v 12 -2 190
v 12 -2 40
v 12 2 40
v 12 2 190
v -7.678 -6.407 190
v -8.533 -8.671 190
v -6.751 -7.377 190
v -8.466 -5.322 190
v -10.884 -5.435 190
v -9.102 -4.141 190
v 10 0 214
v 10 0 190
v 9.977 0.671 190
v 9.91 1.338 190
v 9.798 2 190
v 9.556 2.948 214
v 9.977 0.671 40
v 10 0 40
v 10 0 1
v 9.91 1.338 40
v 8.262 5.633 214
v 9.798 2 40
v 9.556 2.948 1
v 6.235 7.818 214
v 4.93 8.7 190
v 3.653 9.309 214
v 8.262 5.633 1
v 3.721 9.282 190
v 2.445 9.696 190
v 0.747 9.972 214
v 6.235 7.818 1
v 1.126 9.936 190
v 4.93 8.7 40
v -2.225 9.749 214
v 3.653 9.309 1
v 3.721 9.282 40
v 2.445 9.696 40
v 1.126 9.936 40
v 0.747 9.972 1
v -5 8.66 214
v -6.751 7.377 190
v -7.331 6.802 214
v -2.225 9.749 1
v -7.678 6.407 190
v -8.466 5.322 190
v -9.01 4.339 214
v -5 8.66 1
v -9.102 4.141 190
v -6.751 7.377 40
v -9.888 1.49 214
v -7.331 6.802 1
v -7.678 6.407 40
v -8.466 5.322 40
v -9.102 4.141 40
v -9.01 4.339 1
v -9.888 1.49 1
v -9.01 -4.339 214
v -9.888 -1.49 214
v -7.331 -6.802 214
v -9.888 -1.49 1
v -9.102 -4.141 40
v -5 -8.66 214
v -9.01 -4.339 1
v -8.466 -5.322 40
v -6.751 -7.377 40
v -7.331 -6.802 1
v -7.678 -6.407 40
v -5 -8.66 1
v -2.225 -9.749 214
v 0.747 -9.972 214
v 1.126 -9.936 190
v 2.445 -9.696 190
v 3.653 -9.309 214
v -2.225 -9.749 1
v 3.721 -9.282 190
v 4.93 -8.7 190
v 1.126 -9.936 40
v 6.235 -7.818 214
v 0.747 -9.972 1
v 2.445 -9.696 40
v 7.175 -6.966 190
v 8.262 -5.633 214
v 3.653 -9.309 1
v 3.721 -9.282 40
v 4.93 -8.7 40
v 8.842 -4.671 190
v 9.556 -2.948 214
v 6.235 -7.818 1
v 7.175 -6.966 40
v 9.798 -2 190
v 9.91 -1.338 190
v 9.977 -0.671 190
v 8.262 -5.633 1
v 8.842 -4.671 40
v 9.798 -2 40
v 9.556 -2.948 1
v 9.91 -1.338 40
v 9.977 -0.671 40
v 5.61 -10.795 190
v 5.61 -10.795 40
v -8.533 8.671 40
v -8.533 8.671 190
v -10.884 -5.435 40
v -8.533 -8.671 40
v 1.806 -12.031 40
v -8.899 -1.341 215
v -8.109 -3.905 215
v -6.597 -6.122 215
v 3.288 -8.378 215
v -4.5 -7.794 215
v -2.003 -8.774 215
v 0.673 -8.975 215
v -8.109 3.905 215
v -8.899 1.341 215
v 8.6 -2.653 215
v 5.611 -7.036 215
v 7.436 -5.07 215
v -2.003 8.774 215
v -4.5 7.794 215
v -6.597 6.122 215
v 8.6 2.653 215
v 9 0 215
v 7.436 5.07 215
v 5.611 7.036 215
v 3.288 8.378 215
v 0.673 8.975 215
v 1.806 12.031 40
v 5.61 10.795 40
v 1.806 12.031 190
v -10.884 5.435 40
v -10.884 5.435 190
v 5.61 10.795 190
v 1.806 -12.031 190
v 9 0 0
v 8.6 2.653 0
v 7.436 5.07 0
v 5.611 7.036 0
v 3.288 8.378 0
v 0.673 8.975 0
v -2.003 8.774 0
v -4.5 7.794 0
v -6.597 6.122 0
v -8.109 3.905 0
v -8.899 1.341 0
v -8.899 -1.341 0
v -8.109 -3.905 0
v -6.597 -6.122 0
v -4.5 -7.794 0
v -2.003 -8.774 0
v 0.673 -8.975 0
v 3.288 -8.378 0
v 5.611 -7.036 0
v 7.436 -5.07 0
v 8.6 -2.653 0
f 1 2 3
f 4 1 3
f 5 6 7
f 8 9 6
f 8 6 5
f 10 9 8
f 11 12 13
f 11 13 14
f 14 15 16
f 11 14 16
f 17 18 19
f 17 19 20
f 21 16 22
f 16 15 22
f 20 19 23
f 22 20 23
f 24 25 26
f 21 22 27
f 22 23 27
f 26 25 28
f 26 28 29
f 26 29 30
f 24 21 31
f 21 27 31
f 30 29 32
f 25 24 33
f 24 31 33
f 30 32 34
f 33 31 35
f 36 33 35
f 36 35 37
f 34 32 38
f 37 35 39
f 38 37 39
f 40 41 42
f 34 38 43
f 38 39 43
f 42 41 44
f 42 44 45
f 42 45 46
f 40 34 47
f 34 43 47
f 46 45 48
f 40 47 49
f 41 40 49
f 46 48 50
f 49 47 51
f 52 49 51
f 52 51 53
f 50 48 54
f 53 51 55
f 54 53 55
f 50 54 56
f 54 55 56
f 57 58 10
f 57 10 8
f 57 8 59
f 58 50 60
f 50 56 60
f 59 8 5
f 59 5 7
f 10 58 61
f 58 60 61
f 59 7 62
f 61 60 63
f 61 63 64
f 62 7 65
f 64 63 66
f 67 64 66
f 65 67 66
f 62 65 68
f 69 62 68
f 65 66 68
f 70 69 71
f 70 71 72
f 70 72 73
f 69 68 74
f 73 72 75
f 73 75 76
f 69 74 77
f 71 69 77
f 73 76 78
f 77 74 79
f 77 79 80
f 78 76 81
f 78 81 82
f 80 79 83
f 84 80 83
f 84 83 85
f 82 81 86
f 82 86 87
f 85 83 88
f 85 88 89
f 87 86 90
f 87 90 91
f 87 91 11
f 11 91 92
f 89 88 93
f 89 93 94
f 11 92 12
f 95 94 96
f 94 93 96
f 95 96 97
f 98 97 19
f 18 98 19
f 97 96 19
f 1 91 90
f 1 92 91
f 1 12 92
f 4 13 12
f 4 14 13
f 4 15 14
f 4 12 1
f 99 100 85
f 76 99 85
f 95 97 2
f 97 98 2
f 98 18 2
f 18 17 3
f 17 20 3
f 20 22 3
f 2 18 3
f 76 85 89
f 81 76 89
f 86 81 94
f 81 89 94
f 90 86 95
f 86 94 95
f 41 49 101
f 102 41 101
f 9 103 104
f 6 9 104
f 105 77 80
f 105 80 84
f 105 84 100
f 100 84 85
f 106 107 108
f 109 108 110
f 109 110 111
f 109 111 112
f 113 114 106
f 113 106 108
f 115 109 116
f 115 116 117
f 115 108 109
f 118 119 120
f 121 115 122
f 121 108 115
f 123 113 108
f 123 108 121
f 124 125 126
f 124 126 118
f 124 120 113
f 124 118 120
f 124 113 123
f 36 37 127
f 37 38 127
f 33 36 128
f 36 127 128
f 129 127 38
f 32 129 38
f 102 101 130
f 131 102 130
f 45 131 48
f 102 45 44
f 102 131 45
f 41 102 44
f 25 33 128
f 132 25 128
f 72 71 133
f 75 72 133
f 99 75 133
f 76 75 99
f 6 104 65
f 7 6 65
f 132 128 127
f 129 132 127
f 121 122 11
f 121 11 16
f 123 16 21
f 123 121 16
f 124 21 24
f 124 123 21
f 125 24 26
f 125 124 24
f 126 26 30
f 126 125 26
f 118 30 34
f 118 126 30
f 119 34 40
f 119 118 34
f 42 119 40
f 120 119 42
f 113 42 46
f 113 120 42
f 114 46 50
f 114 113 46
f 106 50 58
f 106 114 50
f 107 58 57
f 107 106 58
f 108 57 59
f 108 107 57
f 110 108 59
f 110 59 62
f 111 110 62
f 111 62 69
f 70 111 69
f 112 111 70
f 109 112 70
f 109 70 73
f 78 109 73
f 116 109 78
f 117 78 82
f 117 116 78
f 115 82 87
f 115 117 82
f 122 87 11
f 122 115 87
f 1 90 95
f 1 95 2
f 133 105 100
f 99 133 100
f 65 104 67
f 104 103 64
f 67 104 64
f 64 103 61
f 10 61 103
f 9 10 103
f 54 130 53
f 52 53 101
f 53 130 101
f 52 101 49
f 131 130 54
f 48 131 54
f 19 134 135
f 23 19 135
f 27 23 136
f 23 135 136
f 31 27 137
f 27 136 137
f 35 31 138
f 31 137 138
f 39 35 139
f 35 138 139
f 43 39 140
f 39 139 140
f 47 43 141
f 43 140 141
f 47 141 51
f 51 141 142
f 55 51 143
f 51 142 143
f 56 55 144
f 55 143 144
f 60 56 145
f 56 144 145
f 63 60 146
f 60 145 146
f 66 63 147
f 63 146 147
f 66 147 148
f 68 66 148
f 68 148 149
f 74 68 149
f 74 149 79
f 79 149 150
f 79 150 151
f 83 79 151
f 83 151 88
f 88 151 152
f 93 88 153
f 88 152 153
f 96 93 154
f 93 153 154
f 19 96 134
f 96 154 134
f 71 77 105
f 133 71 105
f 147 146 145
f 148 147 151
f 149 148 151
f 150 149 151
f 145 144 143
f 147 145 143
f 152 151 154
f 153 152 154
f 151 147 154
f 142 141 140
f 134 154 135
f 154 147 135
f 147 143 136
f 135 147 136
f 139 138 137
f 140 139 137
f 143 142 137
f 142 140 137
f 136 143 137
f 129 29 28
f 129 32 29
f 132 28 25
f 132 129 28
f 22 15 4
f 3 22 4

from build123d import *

# Parameters (mm, degrees)
SKETCH1_R           = 10
BOSS_EXTRUDE1_DEPTH = 40
BOSS_EXTRUDE2_START = 40
BOSS_EXTRUDE2_DEPTH = 150
BOSS_EXTRUDE3_START = 190
SKETCH1_4_R         = 10
BOSS_EXTRUDE3_DEPTH = 25
CHAMFER1_SIZE       = 1


with BuildPart() as part:
    # Sketch1 → Boss-Extrude1 (new body)
    with BuildSketch(Plane.XY):
        Circle(SKETCH1_R)
    extrude(amount=BOSS_EXTRUDE1_DEPTH)

    # Sketch1<3> → Boss-Extrude2 (add)
    with BuildSketch(Plane.XY.offset(BOSS_EXTRUDE2_START)):
        with BuildLine():
            ThreePointArc((4.929848865, -8.700378737), (8.090169944, -5.877852523), (9.797958971, -2))
            Line((9.797958971, -2), (12, -2))
            Line((12, -2), (12, 2))
            Line((12, 2), (9.797958971, 2))
            ThreePointArc((9.797958971, 2), (8.090169944, 5.877852523), (4.929848865, 8.700378737))
            Line((4.929848865, 8.700378737), (5.610316965, 10.794644207))
            Line((5.610316965, 10.794644207), (1.8060909, 12.030712184))
            Line((1.8060909, 12.030712184), (1.1256228, 9.936446715))
            ThreePointArc((1.1256228, 9.936446715), (-3.090169944, 9.510565163), (-6.751144813, 7.377129775))
            Line((-6.751144813, 7.377129775), (-8.532633428, 8.671457016))
            Line((-8.532633428, 8.671457016), (-10.883774437, 5.435389039))
            Line((-10.883774437, 5.435389039), (-9.102285822, 4.141061797))
            ThreePointArc((-9.102285822, 4.141061797), (-10, 0), (-9.102285822, -4.141061797))
            Line((-9.102285822, -4.141061797), (-10.883774437, -5.435389039))
            Line((-10.883774437, -5.435389039), (-8.532633428, -8.671457016))
            Line((-8.532633428, -8.671457016), (-6.751144813, -7.377129775))
            ThreePointArc((-6.751144813, -7.377129775), (-3.090169944, -9.510565163), (1.1256228, -9.936446715))
            Line((1.1256228, -9.936446715), (1.8060909, -12.030712184))
            Line((1.8060909, -12.030712184), (5.610316965, -10.794644207))
            Line((5.610316965, -10.794644207), (4.929848865, -8.700378737))
        make_face()
    extrude(amount=BOSS_EXTRUDE2_DEPTH)

    # Sketch1<4> → Boss-Extrude3 (add)
    with BuildSketch(Plane.XY.offset(BOSS_EXTRUDE3_START)):
        Circle(SKETCH1_4_R)
    extrude(amount=BOSS_EXTRUDE3_DEPTH)

    # Chamfer1
    chamfer1_edges = [part.edges().sort_by_distance(p)[0] for p in [
        (-10, 0, 215),
        (-10, 0, 0),
    ]]
    chamfer(chamfer1_edges, length=CHAMFER1_SIZE)


solid = part.part
